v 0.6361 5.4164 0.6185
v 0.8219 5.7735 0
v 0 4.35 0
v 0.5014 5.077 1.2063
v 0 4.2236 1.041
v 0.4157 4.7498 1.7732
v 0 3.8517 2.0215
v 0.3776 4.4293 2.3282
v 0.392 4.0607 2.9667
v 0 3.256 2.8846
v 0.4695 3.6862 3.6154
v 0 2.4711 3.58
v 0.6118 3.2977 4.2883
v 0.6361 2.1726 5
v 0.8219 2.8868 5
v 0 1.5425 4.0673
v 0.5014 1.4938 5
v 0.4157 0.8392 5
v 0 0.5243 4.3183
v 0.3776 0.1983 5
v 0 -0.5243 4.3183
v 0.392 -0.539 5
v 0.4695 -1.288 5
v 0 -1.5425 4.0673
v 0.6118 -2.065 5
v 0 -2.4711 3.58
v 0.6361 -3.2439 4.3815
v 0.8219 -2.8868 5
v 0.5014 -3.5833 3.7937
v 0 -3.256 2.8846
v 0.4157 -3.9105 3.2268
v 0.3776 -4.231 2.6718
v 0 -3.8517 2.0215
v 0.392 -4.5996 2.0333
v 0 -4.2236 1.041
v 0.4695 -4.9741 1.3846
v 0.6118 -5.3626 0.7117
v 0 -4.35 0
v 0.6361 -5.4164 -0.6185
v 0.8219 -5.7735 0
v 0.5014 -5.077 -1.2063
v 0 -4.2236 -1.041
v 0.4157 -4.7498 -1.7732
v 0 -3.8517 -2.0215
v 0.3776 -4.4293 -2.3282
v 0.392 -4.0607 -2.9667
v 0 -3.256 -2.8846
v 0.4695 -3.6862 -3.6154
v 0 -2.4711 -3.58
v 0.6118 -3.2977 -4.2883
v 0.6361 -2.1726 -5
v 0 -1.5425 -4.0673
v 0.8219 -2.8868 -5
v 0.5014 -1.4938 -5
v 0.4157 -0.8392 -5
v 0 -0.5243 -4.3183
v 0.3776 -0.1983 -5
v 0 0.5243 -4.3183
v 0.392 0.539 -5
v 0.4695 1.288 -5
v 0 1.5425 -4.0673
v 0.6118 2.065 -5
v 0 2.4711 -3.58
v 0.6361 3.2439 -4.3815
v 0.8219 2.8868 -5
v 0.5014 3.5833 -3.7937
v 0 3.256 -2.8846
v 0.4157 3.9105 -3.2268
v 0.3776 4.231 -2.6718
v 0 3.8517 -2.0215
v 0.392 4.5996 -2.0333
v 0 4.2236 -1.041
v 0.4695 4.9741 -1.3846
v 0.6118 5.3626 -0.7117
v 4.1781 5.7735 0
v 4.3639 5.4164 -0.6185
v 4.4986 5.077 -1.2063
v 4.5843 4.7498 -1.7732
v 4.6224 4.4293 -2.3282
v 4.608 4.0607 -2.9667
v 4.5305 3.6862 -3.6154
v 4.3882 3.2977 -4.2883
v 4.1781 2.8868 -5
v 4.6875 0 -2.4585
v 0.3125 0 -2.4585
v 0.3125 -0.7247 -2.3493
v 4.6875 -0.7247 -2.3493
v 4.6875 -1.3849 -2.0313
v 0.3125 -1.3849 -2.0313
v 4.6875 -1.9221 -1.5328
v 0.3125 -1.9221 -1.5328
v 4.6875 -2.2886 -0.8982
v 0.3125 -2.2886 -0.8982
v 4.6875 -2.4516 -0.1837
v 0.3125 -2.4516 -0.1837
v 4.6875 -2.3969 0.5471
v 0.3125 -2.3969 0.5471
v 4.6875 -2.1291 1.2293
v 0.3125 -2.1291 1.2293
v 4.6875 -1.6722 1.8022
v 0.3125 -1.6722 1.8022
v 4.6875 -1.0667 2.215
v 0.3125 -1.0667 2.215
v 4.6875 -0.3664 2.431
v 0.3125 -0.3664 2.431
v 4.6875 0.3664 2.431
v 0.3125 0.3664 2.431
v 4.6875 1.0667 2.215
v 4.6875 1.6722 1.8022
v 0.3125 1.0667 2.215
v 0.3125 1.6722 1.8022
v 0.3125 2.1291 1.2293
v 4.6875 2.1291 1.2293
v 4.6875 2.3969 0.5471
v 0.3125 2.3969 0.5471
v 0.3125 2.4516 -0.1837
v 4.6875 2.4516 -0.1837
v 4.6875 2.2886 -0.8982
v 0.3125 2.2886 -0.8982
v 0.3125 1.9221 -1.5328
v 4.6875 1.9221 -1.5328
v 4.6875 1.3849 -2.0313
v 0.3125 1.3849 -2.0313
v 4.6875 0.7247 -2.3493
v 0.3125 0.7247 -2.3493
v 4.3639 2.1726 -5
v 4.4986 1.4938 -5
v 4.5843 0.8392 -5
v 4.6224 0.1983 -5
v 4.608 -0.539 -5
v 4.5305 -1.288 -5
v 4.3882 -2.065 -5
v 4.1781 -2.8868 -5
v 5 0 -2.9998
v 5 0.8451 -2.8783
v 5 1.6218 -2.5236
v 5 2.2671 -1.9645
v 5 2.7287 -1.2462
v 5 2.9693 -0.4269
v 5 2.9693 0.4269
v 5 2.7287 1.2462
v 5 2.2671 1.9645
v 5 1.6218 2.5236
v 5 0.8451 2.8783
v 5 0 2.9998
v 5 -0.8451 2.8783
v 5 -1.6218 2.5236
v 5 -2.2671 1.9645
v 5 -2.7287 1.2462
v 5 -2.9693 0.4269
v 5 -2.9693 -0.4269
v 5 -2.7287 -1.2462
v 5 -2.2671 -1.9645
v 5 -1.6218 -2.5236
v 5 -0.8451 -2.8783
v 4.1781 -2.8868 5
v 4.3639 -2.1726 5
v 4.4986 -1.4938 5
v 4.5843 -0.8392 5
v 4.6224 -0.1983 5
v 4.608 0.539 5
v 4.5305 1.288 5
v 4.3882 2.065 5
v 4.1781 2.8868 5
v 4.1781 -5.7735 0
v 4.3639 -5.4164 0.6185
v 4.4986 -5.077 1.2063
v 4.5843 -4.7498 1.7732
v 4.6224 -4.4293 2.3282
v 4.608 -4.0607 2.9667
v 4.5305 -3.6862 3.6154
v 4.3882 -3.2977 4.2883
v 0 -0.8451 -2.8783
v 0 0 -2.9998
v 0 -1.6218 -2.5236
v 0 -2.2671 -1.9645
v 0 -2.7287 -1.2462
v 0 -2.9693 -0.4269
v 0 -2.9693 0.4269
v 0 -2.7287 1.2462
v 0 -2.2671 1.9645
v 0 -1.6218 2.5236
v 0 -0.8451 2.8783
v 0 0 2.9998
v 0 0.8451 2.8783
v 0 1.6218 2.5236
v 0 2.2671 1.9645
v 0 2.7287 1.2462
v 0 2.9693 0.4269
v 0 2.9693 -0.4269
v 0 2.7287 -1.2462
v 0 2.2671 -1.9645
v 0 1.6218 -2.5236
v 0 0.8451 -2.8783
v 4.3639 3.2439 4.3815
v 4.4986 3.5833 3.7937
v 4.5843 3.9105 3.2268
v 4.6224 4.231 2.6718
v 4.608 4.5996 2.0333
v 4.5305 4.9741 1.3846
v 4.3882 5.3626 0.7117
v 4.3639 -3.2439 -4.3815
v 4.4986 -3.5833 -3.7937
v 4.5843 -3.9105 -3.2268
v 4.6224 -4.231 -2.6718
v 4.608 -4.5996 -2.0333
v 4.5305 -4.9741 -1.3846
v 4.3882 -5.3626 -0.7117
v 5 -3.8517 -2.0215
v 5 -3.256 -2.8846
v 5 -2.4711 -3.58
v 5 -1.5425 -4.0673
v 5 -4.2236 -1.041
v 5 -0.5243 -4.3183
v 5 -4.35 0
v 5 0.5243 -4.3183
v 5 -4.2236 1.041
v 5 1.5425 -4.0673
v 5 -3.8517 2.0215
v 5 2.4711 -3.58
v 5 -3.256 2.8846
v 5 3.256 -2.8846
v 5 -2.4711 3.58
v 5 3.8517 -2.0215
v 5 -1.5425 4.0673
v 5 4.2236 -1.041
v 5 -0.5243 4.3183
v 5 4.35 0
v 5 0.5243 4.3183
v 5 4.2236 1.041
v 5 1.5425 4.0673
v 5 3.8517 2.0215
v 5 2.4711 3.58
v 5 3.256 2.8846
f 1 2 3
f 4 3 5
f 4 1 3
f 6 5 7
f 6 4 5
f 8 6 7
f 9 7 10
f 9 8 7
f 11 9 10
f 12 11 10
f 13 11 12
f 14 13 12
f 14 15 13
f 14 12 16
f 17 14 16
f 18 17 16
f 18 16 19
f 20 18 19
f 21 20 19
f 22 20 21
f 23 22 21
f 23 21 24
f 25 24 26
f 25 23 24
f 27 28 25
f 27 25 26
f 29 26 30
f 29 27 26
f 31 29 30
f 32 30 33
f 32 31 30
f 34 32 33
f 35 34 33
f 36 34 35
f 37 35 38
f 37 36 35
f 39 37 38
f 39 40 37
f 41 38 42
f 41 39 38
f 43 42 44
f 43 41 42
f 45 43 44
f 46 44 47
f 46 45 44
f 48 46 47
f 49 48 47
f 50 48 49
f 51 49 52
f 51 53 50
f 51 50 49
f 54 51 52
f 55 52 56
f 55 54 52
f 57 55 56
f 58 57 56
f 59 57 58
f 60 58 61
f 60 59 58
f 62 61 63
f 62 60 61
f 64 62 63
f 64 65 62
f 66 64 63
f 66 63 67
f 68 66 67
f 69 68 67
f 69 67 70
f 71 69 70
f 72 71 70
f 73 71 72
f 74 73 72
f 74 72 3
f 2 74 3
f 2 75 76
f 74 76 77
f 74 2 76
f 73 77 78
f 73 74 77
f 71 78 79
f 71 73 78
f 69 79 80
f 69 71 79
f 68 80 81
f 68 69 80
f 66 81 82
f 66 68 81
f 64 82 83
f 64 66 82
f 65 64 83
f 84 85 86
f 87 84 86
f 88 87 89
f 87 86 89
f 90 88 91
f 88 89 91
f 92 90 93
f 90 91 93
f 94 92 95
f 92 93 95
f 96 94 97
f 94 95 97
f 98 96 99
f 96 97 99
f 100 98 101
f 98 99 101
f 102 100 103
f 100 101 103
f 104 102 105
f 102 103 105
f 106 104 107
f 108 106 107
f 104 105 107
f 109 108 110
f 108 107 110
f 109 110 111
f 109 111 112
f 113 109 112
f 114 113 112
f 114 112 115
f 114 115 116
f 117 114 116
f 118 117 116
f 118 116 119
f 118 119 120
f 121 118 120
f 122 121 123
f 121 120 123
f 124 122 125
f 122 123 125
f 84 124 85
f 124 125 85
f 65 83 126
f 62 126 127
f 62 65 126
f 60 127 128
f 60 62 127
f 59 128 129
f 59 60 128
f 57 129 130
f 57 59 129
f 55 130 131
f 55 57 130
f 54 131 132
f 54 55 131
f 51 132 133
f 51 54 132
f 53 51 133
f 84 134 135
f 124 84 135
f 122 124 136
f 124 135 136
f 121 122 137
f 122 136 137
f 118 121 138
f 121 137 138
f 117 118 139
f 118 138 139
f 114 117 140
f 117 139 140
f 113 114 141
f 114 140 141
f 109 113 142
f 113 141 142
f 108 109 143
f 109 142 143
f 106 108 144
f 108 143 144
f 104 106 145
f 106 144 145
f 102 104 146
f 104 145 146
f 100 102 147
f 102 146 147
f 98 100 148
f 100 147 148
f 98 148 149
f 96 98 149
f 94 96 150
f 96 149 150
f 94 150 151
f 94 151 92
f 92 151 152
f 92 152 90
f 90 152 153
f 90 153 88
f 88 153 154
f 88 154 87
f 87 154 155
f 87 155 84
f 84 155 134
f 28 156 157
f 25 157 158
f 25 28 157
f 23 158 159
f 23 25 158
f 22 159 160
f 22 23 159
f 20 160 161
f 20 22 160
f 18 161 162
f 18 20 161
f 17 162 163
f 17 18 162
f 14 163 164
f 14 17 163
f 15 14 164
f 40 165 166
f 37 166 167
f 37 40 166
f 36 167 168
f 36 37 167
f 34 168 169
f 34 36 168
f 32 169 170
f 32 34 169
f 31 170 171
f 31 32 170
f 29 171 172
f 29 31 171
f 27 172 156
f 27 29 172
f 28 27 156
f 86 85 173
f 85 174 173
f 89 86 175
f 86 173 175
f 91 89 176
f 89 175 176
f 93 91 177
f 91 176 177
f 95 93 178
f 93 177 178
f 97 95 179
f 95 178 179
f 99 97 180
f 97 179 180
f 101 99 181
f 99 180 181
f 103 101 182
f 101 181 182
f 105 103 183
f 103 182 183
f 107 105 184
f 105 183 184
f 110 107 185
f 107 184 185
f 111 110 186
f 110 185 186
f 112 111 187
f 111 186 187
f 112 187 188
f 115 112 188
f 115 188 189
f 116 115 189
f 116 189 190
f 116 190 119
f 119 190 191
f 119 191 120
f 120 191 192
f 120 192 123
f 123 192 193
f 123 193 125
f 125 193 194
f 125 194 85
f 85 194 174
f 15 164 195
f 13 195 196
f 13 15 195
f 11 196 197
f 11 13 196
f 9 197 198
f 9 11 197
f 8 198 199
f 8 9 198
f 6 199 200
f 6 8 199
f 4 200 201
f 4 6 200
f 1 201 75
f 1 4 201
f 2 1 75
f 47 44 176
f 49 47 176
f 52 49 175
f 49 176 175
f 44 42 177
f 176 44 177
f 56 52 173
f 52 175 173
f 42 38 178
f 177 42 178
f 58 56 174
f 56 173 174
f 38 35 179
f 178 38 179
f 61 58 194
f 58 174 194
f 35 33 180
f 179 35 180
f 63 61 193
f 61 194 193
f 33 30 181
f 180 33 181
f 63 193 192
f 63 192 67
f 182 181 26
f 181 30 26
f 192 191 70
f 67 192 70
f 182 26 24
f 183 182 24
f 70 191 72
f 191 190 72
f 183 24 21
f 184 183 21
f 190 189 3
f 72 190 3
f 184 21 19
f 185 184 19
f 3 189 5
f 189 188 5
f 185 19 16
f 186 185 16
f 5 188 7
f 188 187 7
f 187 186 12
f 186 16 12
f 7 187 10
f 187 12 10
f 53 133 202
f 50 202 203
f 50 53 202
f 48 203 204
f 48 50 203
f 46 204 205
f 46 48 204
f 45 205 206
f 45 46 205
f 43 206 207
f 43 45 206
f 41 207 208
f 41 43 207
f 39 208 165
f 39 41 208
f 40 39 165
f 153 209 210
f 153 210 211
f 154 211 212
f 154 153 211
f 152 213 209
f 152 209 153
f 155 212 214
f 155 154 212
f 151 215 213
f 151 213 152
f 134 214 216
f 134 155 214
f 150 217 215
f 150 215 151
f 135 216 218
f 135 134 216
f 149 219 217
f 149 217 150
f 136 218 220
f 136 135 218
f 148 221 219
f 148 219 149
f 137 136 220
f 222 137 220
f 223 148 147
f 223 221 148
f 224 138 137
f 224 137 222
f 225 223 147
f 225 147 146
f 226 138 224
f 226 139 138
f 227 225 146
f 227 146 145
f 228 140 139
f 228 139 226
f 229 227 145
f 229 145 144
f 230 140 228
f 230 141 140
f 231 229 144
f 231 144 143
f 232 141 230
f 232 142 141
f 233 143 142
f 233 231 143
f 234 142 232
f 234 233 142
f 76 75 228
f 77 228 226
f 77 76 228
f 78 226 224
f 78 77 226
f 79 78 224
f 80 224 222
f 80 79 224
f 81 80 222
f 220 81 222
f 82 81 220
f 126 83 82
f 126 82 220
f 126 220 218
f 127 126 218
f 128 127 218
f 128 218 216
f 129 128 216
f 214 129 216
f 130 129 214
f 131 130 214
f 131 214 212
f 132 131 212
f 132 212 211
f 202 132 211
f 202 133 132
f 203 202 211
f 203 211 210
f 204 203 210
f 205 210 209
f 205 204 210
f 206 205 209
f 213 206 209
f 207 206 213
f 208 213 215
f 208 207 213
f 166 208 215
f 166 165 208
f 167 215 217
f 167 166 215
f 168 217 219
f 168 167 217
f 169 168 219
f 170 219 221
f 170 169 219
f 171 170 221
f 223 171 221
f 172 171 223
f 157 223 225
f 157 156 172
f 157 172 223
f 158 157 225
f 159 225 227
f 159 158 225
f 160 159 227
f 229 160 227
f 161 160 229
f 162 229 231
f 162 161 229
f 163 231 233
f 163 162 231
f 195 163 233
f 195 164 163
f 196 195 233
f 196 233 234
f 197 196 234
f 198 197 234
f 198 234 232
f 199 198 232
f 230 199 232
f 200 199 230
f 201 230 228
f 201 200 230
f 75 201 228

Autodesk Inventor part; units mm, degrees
ref_plane "YZ Plane" through (0, 0, 0) normal (1, 0, 0) x (0, 1, 0)
ref_plane "XZ Plane" through (0, 0, 0) normal (0, 1, 0) x (-1, 0, 0)
sketch "Sketch1" plane through (0, 0, 0) normal (1, 0, 0) x (0, 1, 0)
  line L0 (-5.7735, 0) -> (-2.8868, 5)
  line L1 (-2.8868, 5) -> (2.8868, 5)
  line L2 (2.8868, 5) -> (5.7735, 0)
  line L3 (5.7735, 0) -> (2.8868, -5)
  line L4 (2.8868, -5) -> (-2.8868, -5)
  line L5 (-2.8868, -5) -> (-5.7735, 0)
  point P0 (0, 0)
  point P1 (0, 0)
  dimension "d0" = 11.547
extrude "Body" add sketch "Sketch1" along normal blind 5
sketch "Sketch2" plane through (0, 0, 0) normal (0, 0, 1) x (1, 0, 0)
  line L0 (0, 2.8868) -> (0, 5.7735) projected
  line L1 (0, 5.7735) -> (5, 5.7735) projected
  line L2 (5, 2.8868) -> (5, 5.7735) projected
  line L3 (-1, 0) -> (6, 0) projected
  line L4 (0.8219, 5.7735) -> (0, 4.35)
  line L5 (4.1781, 5.7735) -> (5, 4.35)
  dimension "d3" = 30
  dimension "d4" = 30
  dimension "d5" = 8.7
  dimension "d6" = 8.7
revolve "Chamfer1" cut sketch "Sketch2" angle 360 about axis through (-10, 0, 0) along (1, 0, 0)
sketch "Sketch3" plane through (5, 0, 0) normal (1, 0, 0) x (0, 0, -1)
  arc A0 (-0.625, -1.0825) -> (0.625, -1.0825) centre (0, 0) ccw projected
hole "Thread" at (5, 0, 0) direction (-1, 0, 0) diameter 4.917 end through all thread size "M6x1" class "6H" standard "ISO Metric profile"
chamfer "Chamfer2" distance 0.5413 angle 30 1 edges at (5, 0, 2.4585) measured on face at (5, 3.6714, -0.4458)
chamfer "Chamfer3" distance 0.5413 angle 30 1 edges at (0, 0, 2.4585) measured on face at (0, 3.6714, -0.4458)
ref_plane "Work Plane1" through (-11.0799, 0, 0) normal (0, -0.8660254, -0.5) x (1, 0, 0)
equation "\"d0\" = 1.1547 * SW"
equation "\"d1\" = KOH"
equation "\"d3\" = ANG1"
equation "\"d4\" = ANG2"
equation "\"d5\" = SW0"
equation "\"d6\" = SW01"
equation "\"d8\" = -0.5 * GD1 + 0.5 * NND"
equation "\"d40\" = -0.5 * GD1 + 0.5 * NND"
equation "\"d10\" = -0.5 * GD1 + 0.5 * NND"
equation "\"d41\" = -0.5 * GD1 + 0.5 * NND"
equation "\"ANG1\" = 30deg"
equation "\"ANG2\" = 30deg"
equation "\"NND\" = 6"
equation "\"KOH\" = 5"
equation "\"SW0\" = 8.7"
equation "\"SW01\" = 8.7"
equation "\"GUL\" = 0.541266 * PTC"
equation "\"THREADDIA\" = 6"
equation "\"TOA\" = 30deg"
equation "\"PTC\" = 1"
equation "\"E0\" = 1.155 * SW"
equation "\"GAL\" = 0.541266 * PTC"
equation "\"SW\" = 10"
equation "\"GD1\" = 4.917468"
properties part number "DIN 555-5 - M6" material "Steel, Mild"
